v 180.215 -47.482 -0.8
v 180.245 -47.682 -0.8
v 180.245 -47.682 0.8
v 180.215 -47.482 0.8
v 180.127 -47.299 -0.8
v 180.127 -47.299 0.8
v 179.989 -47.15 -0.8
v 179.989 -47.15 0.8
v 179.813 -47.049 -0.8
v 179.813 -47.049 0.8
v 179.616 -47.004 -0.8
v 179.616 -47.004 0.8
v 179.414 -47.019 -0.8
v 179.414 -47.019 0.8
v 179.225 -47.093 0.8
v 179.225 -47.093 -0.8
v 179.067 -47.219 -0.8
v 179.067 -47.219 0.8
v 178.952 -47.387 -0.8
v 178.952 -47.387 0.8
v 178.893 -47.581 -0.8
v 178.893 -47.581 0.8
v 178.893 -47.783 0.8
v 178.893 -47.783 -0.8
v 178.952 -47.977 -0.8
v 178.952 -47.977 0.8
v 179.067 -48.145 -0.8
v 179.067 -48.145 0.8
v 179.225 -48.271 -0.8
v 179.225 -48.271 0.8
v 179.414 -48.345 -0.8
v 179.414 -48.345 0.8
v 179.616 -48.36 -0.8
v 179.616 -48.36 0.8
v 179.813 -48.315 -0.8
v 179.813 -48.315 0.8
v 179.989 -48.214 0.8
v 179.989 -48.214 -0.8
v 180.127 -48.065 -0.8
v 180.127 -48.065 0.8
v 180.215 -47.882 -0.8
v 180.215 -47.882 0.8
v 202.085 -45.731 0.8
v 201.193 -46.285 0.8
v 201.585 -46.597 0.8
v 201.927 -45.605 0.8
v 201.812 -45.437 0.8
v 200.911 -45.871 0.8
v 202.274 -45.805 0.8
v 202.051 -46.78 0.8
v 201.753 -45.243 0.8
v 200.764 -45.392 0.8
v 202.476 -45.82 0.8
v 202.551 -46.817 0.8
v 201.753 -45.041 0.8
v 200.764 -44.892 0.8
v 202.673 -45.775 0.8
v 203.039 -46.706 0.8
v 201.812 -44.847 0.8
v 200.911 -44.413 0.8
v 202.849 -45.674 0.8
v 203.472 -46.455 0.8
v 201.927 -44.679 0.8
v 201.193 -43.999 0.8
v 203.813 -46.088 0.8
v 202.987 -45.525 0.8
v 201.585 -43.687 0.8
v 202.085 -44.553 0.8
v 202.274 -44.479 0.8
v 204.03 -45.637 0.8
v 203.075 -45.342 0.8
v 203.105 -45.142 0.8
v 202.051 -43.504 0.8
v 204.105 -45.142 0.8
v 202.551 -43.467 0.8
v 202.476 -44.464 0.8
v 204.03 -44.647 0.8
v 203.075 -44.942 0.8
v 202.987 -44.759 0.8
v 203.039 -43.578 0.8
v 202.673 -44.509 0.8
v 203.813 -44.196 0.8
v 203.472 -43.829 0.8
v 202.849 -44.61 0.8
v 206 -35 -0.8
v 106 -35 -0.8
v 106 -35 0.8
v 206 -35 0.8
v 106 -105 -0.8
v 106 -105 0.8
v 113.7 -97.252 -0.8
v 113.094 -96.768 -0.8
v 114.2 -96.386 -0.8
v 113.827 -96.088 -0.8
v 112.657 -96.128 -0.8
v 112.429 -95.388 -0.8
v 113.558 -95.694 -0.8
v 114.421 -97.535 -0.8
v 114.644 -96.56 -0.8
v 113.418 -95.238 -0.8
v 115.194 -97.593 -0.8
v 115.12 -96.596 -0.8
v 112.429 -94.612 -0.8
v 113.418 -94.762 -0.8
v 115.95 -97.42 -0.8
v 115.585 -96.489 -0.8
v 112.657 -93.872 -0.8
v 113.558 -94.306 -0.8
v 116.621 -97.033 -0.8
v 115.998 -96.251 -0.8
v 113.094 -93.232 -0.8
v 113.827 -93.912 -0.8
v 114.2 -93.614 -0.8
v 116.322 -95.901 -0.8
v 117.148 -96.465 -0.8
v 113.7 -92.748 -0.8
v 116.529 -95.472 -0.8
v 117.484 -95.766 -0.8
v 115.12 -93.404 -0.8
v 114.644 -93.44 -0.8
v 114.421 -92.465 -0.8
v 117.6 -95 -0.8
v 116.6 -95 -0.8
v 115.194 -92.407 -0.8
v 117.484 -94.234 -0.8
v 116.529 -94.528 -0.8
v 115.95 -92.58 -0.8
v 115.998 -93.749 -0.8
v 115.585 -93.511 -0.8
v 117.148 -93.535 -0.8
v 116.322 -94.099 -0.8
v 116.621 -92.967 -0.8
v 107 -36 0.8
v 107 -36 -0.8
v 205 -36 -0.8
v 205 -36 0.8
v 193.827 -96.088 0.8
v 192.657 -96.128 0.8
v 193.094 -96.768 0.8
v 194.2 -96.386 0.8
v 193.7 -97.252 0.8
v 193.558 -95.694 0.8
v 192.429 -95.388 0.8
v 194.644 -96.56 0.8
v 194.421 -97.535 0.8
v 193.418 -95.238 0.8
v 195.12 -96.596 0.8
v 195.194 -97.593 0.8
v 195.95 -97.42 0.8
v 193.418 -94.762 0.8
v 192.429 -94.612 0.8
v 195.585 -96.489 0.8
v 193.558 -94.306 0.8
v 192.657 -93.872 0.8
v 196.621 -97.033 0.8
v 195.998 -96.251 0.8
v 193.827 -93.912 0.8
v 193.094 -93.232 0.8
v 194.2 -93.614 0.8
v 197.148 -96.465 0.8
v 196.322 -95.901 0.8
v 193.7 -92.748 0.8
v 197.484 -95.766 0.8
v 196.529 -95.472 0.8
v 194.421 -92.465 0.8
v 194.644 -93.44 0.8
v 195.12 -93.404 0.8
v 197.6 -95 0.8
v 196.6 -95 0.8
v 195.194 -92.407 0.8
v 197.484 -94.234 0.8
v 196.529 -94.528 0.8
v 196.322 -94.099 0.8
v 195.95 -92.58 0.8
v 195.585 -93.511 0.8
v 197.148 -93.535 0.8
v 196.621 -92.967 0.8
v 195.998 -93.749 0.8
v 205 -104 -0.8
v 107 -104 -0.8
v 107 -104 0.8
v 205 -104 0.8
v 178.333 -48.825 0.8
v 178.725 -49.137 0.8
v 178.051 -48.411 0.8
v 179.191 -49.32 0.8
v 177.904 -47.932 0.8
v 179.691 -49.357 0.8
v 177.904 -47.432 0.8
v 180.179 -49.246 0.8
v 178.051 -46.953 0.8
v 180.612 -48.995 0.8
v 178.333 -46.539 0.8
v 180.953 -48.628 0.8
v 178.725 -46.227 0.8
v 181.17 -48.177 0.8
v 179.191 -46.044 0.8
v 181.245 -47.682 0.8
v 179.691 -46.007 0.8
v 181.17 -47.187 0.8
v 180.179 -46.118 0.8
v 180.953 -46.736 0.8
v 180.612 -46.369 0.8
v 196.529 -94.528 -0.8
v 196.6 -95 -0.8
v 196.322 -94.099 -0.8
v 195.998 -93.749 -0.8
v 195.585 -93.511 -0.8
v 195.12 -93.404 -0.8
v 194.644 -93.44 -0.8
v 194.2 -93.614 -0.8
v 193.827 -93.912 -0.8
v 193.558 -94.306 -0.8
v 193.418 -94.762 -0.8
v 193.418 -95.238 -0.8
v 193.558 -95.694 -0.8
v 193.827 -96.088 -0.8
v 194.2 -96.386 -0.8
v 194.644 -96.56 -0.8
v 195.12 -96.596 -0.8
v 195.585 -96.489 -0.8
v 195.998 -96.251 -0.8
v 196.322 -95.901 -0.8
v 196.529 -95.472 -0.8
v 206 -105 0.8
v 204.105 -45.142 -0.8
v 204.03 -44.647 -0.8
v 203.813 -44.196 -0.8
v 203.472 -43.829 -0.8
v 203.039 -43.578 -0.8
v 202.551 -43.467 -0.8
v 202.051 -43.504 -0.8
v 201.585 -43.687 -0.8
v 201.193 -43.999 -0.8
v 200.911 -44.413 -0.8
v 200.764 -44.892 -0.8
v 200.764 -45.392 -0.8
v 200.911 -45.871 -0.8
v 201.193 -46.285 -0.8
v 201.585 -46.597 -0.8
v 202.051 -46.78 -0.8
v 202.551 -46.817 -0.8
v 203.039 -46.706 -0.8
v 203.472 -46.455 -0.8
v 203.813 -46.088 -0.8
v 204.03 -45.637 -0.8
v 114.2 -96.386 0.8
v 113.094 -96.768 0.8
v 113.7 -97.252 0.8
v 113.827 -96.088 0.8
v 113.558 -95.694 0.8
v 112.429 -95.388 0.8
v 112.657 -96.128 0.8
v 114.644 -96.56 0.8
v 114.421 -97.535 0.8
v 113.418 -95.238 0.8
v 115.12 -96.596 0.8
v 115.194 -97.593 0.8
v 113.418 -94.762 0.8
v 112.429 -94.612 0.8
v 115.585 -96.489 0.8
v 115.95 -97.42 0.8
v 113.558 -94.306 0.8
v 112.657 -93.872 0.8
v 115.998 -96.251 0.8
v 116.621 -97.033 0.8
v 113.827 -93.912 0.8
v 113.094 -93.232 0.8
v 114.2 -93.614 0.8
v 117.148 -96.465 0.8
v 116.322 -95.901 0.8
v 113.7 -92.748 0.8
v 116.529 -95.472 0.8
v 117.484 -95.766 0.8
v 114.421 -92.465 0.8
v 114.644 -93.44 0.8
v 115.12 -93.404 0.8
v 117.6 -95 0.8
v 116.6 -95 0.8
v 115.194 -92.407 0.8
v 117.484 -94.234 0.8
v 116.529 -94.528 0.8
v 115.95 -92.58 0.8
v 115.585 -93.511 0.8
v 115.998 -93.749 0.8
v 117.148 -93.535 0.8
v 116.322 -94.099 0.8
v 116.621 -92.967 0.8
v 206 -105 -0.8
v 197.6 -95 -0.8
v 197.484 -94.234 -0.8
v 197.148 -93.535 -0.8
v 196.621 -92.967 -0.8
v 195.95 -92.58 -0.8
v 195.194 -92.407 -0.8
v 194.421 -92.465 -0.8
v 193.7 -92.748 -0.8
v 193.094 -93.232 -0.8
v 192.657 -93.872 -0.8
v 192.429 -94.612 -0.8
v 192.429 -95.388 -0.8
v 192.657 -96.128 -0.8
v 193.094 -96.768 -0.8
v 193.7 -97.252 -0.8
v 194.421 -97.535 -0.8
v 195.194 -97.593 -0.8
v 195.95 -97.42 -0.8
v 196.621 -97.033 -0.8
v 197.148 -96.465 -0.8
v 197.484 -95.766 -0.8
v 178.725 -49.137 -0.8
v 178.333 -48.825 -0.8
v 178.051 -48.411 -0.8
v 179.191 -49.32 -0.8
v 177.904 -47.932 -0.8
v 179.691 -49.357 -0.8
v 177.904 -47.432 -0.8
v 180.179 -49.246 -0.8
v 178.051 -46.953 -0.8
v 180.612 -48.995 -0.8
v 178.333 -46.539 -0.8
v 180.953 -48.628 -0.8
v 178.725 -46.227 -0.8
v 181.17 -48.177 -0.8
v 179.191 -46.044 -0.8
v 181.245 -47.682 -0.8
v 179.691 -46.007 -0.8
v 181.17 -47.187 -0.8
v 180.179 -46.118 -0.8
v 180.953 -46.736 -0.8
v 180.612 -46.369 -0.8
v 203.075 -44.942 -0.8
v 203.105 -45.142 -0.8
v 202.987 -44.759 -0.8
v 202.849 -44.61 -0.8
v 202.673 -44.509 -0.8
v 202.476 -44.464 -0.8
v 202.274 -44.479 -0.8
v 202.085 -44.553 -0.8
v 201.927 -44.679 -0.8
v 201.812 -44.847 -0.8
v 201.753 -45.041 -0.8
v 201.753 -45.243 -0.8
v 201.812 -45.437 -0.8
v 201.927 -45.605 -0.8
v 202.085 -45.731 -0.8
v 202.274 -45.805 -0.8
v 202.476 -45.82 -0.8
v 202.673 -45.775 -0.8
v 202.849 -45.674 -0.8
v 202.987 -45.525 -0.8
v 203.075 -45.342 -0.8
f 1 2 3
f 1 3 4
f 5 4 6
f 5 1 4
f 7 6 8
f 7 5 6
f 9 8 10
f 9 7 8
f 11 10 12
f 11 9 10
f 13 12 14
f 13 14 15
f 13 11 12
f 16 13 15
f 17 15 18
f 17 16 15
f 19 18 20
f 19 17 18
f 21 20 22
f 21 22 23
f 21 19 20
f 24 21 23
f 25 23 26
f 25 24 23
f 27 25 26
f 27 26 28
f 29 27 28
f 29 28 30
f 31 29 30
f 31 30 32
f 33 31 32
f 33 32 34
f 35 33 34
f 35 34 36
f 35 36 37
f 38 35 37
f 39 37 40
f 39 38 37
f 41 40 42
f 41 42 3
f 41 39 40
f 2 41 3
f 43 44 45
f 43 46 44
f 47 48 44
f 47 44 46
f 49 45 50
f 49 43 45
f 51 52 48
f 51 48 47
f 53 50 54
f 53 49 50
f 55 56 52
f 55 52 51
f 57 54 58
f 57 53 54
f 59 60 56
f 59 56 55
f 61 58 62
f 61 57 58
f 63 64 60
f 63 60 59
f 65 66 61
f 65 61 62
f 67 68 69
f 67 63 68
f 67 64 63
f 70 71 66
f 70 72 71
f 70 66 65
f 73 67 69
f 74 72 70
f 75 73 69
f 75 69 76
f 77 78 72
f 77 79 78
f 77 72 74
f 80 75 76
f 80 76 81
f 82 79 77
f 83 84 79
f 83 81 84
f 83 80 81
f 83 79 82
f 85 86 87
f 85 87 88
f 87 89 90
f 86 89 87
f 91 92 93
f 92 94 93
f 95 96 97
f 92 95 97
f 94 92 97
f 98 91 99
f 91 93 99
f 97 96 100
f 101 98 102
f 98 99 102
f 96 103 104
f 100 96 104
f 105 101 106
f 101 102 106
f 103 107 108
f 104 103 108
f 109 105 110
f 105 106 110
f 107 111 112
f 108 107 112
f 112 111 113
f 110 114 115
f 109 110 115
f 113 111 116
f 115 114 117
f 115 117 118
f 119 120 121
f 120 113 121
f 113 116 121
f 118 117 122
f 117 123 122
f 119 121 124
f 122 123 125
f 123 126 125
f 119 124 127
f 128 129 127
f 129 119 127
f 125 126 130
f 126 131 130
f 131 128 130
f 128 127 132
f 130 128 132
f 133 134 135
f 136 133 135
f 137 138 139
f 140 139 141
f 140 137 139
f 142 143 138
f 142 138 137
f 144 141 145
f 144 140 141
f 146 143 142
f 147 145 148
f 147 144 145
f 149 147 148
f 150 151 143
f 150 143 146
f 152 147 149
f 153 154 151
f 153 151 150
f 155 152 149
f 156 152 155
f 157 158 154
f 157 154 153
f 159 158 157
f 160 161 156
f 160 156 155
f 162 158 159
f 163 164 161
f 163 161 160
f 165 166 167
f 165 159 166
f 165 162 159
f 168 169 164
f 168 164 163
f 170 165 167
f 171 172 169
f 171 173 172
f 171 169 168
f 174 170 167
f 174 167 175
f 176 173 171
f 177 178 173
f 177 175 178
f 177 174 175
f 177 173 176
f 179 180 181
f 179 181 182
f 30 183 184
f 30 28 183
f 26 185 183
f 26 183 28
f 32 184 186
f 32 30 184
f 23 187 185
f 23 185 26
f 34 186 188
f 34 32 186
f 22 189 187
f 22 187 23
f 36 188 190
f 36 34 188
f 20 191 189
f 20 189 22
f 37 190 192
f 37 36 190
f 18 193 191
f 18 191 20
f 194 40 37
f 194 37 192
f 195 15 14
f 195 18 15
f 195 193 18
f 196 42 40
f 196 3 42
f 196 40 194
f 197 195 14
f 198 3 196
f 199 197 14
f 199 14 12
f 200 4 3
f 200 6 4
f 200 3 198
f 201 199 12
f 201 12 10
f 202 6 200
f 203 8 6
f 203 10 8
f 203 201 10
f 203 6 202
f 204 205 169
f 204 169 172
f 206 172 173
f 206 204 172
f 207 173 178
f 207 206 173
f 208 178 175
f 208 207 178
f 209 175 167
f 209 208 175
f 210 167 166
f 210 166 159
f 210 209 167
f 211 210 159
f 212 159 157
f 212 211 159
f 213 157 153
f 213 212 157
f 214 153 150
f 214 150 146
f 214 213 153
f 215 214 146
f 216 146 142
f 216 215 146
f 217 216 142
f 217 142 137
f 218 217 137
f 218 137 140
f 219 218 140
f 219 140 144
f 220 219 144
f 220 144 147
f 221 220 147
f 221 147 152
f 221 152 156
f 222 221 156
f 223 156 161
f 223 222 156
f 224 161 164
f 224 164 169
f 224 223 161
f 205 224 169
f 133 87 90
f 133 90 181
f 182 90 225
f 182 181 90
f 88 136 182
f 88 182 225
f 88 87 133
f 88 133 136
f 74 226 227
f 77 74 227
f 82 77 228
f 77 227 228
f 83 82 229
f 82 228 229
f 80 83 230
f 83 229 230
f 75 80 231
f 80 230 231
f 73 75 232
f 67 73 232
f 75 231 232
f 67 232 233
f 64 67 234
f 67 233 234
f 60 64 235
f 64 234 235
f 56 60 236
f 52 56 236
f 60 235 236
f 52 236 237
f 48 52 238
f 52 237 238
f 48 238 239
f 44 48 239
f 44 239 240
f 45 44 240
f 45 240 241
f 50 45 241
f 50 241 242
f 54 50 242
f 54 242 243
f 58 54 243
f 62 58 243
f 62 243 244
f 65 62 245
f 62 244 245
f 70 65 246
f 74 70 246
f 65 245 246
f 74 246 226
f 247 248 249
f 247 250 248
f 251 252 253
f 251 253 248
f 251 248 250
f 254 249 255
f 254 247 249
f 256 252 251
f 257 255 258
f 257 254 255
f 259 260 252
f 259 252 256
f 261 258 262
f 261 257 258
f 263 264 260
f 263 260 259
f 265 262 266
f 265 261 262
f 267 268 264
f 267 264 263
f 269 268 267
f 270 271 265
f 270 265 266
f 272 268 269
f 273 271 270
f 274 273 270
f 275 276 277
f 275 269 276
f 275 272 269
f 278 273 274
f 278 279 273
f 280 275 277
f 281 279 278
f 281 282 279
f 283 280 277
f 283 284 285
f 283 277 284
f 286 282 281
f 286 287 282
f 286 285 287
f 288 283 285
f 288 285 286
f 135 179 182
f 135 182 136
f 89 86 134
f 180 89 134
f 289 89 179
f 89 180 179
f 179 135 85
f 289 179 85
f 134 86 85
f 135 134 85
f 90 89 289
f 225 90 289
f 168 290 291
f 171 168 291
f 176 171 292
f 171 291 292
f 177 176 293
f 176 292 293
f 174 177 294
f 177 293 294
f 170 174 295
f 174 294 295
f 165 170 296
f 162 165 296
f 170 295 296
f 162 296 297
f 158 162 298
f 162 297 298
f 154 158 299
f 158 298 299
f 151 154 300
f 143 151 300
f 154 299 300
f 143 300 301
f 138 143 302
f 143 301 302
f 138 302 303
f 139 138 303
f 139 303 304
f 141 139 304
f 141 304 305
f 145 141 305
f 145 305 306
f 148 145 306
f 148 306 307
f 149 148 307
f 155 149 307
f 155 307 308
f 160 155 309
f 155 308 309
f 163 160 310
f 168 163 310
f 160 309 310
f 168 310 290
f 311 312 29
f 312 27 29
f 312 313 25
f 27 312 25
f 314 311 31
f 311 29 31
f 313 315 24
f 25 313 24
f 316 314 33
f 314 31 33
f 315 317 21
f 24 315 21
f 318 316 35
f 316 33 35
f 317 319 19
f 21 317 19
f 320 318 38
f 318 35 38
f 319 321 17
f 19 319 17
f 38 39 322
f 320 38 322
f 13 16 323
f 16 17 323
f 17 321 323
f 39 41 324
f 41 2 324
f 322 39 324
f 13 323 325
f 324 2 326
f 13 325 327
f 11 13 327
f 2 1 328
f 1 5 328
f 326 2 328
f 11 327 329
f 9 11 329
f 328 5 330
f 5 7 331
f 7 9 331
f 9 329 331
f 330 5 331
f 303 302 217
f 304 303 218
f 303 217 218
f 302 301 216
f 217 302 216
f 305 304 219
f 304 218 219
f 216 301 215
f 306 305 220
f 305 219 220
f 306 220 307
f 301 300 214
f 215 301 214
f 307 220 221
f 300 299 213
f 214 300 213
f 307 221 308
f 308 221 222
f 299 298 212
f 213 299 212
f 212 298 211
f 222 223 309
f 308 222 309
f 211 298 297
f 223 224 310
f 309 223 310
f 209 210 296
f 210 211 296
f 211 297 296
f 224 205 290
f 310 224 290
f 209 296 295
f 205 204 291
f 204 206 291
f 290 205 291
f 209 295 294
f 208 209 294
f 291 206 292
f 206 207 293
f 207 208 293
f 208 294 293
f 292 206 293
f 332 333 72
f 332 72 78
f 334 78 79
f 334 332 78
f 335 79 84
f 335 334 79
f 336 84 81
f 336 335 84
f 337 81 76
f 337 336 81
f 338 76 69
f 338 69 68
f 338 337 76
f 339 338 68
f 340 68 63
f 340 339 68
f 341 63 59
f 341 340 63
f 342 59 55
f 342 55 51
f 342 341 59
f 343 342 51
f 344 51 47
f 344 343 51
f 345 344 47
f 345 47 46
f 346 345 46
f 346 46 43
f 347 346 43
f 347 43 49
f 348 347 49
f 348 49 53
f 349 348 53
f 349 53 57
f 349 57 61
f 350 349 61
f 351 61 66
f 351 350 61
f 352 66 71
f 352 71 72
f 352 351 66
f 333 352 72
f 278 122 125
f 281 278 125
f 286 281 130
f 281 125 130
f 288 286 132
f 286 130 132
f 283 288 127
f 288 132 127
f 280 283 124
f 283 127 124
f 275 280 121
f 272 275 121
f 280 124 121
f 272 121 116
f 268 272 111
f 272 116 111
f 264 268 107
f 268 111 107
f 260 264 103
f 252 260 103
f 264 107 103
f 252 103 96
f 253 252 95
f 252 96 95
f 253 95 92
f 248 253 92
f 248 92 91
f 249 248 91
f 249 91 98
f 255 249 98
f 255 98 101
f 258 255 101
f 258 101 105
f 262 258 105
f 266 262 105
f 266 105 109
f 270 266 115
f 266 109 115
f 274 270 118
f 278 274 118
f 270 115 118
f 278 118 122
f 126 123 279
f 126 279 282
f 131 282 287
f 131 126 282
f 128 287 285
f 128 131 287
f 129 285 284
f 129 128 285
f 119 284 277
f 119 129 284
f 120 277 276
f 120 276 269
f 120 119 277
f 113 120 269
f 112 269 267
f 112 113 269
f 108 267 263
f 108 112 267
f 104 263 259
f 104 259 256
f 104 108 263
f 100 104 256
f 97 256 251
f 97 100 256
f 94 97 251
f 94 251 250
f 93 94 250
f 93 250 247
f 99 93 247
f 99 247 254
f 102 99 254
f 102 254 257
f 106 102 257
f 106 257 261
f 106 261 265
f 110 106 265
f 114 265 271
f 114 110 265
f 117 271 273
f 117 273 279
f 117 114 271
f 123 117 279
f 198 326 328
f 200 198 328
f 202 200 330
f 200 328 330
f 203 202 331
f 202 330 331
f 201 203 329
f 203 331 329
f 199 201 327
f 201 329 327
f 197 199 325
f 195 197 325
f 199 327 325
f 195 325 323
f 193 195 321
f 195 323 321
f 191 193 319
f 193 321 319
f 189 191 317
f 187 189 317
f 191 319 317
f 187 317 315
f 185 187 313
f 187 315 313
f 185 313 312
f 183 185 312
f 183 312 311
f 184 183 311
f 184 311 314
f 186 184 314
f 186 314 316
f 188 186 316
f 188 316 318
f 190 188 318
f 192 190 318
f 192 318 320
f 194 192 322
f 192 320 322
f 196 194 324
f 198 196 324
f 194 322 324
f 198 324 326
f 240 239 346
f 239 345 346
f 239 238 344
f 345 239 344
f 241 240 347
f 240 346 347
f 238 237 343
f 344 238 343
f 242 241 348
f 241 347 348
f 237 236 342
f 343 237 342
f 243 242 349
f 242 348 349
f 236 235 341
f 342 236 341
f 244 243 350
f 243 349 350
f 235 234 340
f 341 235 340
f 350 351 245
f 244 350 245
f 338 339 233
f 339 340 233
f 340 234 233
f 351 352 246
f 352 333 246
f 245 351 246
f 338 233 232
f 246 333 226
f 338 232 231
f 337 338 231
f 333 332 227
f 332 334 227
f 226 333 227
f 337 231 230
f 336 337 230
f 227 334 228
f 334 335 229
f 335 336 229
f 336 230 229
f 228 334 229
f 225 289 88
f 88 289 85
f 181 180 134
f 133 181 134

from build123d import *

# Parameters (mm, degrees)
BOSS_EXTRUDE1_DEPTH        = 0.8
BOSS_EXTRUDE1_DEPTH_BACK   = 0.8
SKETCH1_W                  = 100
SKETCH1_H                  = 70
SKETCH1_W_2                = 98
SKETCH1_H_2                = 68
BOSS_EXTRUDE1_2_DEPTH      = 0.8
BOSS_EXTRUDE1_2_DEPTH_BACK = 0.8
SKETCH1_R                  = 2.6
SKETCH1_R_2                = 1.6
BOSS_EXTRUDE1_3_DEPTH      = 0.8
BOSS_EXTRUDE1_3_DEPTH_BACK = 0.8
BOSS_EXTRUDE1_4_DEPTH      = 0.8
BOSS_EXTRUDE1_4_DEPTH_BACK = 0.8
SKETCH1_R_3                = 1.68
SKETCH1_R_4                = 0.68
BOSS_EXTRUDE1_5_DEPTH      = 0.8
BOSS_EXTRUDE1_5_DEPTH_BACK = 0.8


with BuildPart() as part:
    # Sketch1 → Boss-Extrude1 (new, two sides: drawn at the far end of the back side and taken through both)
    with BuildSketch(Plane.XY.offset(-BOSS_EXTRUDE1_DEPTH_BACK)):
        with Locations((156, -70)):
            Rectangle(SKETCH1_W, SKETCH1_H)
        with Locations((156, -70)):
            Rectangle(SKETCH1_W_2, SKETCH1_H_2, mode=Mode.SUBTRACT)
    extrude(amount=BOSS_EXTRUDE1_DEPTH + BOSS_EXTRUDE1_DEPTH_BACK)


with BuildPart() as body_2:
    # Sketch1 → Boss-Extrude1 2 (new, two sides: drawn at the far end of the back side and taken through both)
    with BuildSketch(Plane.XY.offset(-BOSS_EXTRUDE1_2_DEPTH_BACK)):
        with Locations((115, -95)):
            Circle(SKETCH1_R)
        with Locations((115, -95)):
            Circle(SKETCH1_R_2, mode=Mode.SUBTRACT)
    extrude(amount=BOSS_EXTRUDE1_2_DEPTH + BOSS_EXTRUDE1_2_DEPTH_BACK)


with BuildPart() as body_3:
    # Sketch1 → Boss-Extrude1 3 (new, two sides: drawn at the far end of the back side and taken through both)
    with BuildSketch(Plane.XY.offset(-BOSS_EXTRUDE1_3_DEPTH_BACK)):
        with Locations((195, -95)):
            Circle(SKETCH1_R)
        with Locations((195, -95)):
            Circle(SKETCH1_R_2, mode=Mode.SUBTRACT)
    extrude(amount=BOSS_EXTRUDE1_3_DEPTH + BOSS_EXTRUDE1_3_DEPTH_BACK)


with BuildPart() as body_4:
    # Sketch1 → Boss-Extrude1 4 (new, two sides: drawn at the far end of the back side and taken through both)
    with BuildSketch(Plane.XY.offset(-BOSS_EXTRUDE1_4_DEPTH_BACK)):
        with Locations((179.565, -47.682)):
            Circle(SKETCH1_R_3)
        with Locations((179.565, -47.682)):
            Circle(SKETCH1_R_4, mode=Mode.SUBTRACT)
    extrude(amount=BOSS_EXTRUDE1_4_DEPTH + BOSS_EXTRUDE1_4_DEPTH_BACK)


with BuildPart() as body_5:
    # Sketch1 → Boss-Extrude1 5 (new, two sides: drawn at the far end of the back side and taken through both)
    with BuildSketch(Plane.XY.offset(-BOSS_EXTRUDE1_5_DEPTH_BACK)):
        with Locations((202.425, -45.142)):
            Circle(SKETCH1_R_3)
        with Locations((202.425, -45.142)):
            Circle(SKETCH1_R_4, mode=Mode.SUBTRACT)
    extrude(amount=BOSS_EXTRUDE1_5_DEPTH + BOSS_EXTRUDE1_5_DEPTH_BACK)


solid = Compound([part.part, body_2.part, body_3.part, body_4.part, body_5.part])
